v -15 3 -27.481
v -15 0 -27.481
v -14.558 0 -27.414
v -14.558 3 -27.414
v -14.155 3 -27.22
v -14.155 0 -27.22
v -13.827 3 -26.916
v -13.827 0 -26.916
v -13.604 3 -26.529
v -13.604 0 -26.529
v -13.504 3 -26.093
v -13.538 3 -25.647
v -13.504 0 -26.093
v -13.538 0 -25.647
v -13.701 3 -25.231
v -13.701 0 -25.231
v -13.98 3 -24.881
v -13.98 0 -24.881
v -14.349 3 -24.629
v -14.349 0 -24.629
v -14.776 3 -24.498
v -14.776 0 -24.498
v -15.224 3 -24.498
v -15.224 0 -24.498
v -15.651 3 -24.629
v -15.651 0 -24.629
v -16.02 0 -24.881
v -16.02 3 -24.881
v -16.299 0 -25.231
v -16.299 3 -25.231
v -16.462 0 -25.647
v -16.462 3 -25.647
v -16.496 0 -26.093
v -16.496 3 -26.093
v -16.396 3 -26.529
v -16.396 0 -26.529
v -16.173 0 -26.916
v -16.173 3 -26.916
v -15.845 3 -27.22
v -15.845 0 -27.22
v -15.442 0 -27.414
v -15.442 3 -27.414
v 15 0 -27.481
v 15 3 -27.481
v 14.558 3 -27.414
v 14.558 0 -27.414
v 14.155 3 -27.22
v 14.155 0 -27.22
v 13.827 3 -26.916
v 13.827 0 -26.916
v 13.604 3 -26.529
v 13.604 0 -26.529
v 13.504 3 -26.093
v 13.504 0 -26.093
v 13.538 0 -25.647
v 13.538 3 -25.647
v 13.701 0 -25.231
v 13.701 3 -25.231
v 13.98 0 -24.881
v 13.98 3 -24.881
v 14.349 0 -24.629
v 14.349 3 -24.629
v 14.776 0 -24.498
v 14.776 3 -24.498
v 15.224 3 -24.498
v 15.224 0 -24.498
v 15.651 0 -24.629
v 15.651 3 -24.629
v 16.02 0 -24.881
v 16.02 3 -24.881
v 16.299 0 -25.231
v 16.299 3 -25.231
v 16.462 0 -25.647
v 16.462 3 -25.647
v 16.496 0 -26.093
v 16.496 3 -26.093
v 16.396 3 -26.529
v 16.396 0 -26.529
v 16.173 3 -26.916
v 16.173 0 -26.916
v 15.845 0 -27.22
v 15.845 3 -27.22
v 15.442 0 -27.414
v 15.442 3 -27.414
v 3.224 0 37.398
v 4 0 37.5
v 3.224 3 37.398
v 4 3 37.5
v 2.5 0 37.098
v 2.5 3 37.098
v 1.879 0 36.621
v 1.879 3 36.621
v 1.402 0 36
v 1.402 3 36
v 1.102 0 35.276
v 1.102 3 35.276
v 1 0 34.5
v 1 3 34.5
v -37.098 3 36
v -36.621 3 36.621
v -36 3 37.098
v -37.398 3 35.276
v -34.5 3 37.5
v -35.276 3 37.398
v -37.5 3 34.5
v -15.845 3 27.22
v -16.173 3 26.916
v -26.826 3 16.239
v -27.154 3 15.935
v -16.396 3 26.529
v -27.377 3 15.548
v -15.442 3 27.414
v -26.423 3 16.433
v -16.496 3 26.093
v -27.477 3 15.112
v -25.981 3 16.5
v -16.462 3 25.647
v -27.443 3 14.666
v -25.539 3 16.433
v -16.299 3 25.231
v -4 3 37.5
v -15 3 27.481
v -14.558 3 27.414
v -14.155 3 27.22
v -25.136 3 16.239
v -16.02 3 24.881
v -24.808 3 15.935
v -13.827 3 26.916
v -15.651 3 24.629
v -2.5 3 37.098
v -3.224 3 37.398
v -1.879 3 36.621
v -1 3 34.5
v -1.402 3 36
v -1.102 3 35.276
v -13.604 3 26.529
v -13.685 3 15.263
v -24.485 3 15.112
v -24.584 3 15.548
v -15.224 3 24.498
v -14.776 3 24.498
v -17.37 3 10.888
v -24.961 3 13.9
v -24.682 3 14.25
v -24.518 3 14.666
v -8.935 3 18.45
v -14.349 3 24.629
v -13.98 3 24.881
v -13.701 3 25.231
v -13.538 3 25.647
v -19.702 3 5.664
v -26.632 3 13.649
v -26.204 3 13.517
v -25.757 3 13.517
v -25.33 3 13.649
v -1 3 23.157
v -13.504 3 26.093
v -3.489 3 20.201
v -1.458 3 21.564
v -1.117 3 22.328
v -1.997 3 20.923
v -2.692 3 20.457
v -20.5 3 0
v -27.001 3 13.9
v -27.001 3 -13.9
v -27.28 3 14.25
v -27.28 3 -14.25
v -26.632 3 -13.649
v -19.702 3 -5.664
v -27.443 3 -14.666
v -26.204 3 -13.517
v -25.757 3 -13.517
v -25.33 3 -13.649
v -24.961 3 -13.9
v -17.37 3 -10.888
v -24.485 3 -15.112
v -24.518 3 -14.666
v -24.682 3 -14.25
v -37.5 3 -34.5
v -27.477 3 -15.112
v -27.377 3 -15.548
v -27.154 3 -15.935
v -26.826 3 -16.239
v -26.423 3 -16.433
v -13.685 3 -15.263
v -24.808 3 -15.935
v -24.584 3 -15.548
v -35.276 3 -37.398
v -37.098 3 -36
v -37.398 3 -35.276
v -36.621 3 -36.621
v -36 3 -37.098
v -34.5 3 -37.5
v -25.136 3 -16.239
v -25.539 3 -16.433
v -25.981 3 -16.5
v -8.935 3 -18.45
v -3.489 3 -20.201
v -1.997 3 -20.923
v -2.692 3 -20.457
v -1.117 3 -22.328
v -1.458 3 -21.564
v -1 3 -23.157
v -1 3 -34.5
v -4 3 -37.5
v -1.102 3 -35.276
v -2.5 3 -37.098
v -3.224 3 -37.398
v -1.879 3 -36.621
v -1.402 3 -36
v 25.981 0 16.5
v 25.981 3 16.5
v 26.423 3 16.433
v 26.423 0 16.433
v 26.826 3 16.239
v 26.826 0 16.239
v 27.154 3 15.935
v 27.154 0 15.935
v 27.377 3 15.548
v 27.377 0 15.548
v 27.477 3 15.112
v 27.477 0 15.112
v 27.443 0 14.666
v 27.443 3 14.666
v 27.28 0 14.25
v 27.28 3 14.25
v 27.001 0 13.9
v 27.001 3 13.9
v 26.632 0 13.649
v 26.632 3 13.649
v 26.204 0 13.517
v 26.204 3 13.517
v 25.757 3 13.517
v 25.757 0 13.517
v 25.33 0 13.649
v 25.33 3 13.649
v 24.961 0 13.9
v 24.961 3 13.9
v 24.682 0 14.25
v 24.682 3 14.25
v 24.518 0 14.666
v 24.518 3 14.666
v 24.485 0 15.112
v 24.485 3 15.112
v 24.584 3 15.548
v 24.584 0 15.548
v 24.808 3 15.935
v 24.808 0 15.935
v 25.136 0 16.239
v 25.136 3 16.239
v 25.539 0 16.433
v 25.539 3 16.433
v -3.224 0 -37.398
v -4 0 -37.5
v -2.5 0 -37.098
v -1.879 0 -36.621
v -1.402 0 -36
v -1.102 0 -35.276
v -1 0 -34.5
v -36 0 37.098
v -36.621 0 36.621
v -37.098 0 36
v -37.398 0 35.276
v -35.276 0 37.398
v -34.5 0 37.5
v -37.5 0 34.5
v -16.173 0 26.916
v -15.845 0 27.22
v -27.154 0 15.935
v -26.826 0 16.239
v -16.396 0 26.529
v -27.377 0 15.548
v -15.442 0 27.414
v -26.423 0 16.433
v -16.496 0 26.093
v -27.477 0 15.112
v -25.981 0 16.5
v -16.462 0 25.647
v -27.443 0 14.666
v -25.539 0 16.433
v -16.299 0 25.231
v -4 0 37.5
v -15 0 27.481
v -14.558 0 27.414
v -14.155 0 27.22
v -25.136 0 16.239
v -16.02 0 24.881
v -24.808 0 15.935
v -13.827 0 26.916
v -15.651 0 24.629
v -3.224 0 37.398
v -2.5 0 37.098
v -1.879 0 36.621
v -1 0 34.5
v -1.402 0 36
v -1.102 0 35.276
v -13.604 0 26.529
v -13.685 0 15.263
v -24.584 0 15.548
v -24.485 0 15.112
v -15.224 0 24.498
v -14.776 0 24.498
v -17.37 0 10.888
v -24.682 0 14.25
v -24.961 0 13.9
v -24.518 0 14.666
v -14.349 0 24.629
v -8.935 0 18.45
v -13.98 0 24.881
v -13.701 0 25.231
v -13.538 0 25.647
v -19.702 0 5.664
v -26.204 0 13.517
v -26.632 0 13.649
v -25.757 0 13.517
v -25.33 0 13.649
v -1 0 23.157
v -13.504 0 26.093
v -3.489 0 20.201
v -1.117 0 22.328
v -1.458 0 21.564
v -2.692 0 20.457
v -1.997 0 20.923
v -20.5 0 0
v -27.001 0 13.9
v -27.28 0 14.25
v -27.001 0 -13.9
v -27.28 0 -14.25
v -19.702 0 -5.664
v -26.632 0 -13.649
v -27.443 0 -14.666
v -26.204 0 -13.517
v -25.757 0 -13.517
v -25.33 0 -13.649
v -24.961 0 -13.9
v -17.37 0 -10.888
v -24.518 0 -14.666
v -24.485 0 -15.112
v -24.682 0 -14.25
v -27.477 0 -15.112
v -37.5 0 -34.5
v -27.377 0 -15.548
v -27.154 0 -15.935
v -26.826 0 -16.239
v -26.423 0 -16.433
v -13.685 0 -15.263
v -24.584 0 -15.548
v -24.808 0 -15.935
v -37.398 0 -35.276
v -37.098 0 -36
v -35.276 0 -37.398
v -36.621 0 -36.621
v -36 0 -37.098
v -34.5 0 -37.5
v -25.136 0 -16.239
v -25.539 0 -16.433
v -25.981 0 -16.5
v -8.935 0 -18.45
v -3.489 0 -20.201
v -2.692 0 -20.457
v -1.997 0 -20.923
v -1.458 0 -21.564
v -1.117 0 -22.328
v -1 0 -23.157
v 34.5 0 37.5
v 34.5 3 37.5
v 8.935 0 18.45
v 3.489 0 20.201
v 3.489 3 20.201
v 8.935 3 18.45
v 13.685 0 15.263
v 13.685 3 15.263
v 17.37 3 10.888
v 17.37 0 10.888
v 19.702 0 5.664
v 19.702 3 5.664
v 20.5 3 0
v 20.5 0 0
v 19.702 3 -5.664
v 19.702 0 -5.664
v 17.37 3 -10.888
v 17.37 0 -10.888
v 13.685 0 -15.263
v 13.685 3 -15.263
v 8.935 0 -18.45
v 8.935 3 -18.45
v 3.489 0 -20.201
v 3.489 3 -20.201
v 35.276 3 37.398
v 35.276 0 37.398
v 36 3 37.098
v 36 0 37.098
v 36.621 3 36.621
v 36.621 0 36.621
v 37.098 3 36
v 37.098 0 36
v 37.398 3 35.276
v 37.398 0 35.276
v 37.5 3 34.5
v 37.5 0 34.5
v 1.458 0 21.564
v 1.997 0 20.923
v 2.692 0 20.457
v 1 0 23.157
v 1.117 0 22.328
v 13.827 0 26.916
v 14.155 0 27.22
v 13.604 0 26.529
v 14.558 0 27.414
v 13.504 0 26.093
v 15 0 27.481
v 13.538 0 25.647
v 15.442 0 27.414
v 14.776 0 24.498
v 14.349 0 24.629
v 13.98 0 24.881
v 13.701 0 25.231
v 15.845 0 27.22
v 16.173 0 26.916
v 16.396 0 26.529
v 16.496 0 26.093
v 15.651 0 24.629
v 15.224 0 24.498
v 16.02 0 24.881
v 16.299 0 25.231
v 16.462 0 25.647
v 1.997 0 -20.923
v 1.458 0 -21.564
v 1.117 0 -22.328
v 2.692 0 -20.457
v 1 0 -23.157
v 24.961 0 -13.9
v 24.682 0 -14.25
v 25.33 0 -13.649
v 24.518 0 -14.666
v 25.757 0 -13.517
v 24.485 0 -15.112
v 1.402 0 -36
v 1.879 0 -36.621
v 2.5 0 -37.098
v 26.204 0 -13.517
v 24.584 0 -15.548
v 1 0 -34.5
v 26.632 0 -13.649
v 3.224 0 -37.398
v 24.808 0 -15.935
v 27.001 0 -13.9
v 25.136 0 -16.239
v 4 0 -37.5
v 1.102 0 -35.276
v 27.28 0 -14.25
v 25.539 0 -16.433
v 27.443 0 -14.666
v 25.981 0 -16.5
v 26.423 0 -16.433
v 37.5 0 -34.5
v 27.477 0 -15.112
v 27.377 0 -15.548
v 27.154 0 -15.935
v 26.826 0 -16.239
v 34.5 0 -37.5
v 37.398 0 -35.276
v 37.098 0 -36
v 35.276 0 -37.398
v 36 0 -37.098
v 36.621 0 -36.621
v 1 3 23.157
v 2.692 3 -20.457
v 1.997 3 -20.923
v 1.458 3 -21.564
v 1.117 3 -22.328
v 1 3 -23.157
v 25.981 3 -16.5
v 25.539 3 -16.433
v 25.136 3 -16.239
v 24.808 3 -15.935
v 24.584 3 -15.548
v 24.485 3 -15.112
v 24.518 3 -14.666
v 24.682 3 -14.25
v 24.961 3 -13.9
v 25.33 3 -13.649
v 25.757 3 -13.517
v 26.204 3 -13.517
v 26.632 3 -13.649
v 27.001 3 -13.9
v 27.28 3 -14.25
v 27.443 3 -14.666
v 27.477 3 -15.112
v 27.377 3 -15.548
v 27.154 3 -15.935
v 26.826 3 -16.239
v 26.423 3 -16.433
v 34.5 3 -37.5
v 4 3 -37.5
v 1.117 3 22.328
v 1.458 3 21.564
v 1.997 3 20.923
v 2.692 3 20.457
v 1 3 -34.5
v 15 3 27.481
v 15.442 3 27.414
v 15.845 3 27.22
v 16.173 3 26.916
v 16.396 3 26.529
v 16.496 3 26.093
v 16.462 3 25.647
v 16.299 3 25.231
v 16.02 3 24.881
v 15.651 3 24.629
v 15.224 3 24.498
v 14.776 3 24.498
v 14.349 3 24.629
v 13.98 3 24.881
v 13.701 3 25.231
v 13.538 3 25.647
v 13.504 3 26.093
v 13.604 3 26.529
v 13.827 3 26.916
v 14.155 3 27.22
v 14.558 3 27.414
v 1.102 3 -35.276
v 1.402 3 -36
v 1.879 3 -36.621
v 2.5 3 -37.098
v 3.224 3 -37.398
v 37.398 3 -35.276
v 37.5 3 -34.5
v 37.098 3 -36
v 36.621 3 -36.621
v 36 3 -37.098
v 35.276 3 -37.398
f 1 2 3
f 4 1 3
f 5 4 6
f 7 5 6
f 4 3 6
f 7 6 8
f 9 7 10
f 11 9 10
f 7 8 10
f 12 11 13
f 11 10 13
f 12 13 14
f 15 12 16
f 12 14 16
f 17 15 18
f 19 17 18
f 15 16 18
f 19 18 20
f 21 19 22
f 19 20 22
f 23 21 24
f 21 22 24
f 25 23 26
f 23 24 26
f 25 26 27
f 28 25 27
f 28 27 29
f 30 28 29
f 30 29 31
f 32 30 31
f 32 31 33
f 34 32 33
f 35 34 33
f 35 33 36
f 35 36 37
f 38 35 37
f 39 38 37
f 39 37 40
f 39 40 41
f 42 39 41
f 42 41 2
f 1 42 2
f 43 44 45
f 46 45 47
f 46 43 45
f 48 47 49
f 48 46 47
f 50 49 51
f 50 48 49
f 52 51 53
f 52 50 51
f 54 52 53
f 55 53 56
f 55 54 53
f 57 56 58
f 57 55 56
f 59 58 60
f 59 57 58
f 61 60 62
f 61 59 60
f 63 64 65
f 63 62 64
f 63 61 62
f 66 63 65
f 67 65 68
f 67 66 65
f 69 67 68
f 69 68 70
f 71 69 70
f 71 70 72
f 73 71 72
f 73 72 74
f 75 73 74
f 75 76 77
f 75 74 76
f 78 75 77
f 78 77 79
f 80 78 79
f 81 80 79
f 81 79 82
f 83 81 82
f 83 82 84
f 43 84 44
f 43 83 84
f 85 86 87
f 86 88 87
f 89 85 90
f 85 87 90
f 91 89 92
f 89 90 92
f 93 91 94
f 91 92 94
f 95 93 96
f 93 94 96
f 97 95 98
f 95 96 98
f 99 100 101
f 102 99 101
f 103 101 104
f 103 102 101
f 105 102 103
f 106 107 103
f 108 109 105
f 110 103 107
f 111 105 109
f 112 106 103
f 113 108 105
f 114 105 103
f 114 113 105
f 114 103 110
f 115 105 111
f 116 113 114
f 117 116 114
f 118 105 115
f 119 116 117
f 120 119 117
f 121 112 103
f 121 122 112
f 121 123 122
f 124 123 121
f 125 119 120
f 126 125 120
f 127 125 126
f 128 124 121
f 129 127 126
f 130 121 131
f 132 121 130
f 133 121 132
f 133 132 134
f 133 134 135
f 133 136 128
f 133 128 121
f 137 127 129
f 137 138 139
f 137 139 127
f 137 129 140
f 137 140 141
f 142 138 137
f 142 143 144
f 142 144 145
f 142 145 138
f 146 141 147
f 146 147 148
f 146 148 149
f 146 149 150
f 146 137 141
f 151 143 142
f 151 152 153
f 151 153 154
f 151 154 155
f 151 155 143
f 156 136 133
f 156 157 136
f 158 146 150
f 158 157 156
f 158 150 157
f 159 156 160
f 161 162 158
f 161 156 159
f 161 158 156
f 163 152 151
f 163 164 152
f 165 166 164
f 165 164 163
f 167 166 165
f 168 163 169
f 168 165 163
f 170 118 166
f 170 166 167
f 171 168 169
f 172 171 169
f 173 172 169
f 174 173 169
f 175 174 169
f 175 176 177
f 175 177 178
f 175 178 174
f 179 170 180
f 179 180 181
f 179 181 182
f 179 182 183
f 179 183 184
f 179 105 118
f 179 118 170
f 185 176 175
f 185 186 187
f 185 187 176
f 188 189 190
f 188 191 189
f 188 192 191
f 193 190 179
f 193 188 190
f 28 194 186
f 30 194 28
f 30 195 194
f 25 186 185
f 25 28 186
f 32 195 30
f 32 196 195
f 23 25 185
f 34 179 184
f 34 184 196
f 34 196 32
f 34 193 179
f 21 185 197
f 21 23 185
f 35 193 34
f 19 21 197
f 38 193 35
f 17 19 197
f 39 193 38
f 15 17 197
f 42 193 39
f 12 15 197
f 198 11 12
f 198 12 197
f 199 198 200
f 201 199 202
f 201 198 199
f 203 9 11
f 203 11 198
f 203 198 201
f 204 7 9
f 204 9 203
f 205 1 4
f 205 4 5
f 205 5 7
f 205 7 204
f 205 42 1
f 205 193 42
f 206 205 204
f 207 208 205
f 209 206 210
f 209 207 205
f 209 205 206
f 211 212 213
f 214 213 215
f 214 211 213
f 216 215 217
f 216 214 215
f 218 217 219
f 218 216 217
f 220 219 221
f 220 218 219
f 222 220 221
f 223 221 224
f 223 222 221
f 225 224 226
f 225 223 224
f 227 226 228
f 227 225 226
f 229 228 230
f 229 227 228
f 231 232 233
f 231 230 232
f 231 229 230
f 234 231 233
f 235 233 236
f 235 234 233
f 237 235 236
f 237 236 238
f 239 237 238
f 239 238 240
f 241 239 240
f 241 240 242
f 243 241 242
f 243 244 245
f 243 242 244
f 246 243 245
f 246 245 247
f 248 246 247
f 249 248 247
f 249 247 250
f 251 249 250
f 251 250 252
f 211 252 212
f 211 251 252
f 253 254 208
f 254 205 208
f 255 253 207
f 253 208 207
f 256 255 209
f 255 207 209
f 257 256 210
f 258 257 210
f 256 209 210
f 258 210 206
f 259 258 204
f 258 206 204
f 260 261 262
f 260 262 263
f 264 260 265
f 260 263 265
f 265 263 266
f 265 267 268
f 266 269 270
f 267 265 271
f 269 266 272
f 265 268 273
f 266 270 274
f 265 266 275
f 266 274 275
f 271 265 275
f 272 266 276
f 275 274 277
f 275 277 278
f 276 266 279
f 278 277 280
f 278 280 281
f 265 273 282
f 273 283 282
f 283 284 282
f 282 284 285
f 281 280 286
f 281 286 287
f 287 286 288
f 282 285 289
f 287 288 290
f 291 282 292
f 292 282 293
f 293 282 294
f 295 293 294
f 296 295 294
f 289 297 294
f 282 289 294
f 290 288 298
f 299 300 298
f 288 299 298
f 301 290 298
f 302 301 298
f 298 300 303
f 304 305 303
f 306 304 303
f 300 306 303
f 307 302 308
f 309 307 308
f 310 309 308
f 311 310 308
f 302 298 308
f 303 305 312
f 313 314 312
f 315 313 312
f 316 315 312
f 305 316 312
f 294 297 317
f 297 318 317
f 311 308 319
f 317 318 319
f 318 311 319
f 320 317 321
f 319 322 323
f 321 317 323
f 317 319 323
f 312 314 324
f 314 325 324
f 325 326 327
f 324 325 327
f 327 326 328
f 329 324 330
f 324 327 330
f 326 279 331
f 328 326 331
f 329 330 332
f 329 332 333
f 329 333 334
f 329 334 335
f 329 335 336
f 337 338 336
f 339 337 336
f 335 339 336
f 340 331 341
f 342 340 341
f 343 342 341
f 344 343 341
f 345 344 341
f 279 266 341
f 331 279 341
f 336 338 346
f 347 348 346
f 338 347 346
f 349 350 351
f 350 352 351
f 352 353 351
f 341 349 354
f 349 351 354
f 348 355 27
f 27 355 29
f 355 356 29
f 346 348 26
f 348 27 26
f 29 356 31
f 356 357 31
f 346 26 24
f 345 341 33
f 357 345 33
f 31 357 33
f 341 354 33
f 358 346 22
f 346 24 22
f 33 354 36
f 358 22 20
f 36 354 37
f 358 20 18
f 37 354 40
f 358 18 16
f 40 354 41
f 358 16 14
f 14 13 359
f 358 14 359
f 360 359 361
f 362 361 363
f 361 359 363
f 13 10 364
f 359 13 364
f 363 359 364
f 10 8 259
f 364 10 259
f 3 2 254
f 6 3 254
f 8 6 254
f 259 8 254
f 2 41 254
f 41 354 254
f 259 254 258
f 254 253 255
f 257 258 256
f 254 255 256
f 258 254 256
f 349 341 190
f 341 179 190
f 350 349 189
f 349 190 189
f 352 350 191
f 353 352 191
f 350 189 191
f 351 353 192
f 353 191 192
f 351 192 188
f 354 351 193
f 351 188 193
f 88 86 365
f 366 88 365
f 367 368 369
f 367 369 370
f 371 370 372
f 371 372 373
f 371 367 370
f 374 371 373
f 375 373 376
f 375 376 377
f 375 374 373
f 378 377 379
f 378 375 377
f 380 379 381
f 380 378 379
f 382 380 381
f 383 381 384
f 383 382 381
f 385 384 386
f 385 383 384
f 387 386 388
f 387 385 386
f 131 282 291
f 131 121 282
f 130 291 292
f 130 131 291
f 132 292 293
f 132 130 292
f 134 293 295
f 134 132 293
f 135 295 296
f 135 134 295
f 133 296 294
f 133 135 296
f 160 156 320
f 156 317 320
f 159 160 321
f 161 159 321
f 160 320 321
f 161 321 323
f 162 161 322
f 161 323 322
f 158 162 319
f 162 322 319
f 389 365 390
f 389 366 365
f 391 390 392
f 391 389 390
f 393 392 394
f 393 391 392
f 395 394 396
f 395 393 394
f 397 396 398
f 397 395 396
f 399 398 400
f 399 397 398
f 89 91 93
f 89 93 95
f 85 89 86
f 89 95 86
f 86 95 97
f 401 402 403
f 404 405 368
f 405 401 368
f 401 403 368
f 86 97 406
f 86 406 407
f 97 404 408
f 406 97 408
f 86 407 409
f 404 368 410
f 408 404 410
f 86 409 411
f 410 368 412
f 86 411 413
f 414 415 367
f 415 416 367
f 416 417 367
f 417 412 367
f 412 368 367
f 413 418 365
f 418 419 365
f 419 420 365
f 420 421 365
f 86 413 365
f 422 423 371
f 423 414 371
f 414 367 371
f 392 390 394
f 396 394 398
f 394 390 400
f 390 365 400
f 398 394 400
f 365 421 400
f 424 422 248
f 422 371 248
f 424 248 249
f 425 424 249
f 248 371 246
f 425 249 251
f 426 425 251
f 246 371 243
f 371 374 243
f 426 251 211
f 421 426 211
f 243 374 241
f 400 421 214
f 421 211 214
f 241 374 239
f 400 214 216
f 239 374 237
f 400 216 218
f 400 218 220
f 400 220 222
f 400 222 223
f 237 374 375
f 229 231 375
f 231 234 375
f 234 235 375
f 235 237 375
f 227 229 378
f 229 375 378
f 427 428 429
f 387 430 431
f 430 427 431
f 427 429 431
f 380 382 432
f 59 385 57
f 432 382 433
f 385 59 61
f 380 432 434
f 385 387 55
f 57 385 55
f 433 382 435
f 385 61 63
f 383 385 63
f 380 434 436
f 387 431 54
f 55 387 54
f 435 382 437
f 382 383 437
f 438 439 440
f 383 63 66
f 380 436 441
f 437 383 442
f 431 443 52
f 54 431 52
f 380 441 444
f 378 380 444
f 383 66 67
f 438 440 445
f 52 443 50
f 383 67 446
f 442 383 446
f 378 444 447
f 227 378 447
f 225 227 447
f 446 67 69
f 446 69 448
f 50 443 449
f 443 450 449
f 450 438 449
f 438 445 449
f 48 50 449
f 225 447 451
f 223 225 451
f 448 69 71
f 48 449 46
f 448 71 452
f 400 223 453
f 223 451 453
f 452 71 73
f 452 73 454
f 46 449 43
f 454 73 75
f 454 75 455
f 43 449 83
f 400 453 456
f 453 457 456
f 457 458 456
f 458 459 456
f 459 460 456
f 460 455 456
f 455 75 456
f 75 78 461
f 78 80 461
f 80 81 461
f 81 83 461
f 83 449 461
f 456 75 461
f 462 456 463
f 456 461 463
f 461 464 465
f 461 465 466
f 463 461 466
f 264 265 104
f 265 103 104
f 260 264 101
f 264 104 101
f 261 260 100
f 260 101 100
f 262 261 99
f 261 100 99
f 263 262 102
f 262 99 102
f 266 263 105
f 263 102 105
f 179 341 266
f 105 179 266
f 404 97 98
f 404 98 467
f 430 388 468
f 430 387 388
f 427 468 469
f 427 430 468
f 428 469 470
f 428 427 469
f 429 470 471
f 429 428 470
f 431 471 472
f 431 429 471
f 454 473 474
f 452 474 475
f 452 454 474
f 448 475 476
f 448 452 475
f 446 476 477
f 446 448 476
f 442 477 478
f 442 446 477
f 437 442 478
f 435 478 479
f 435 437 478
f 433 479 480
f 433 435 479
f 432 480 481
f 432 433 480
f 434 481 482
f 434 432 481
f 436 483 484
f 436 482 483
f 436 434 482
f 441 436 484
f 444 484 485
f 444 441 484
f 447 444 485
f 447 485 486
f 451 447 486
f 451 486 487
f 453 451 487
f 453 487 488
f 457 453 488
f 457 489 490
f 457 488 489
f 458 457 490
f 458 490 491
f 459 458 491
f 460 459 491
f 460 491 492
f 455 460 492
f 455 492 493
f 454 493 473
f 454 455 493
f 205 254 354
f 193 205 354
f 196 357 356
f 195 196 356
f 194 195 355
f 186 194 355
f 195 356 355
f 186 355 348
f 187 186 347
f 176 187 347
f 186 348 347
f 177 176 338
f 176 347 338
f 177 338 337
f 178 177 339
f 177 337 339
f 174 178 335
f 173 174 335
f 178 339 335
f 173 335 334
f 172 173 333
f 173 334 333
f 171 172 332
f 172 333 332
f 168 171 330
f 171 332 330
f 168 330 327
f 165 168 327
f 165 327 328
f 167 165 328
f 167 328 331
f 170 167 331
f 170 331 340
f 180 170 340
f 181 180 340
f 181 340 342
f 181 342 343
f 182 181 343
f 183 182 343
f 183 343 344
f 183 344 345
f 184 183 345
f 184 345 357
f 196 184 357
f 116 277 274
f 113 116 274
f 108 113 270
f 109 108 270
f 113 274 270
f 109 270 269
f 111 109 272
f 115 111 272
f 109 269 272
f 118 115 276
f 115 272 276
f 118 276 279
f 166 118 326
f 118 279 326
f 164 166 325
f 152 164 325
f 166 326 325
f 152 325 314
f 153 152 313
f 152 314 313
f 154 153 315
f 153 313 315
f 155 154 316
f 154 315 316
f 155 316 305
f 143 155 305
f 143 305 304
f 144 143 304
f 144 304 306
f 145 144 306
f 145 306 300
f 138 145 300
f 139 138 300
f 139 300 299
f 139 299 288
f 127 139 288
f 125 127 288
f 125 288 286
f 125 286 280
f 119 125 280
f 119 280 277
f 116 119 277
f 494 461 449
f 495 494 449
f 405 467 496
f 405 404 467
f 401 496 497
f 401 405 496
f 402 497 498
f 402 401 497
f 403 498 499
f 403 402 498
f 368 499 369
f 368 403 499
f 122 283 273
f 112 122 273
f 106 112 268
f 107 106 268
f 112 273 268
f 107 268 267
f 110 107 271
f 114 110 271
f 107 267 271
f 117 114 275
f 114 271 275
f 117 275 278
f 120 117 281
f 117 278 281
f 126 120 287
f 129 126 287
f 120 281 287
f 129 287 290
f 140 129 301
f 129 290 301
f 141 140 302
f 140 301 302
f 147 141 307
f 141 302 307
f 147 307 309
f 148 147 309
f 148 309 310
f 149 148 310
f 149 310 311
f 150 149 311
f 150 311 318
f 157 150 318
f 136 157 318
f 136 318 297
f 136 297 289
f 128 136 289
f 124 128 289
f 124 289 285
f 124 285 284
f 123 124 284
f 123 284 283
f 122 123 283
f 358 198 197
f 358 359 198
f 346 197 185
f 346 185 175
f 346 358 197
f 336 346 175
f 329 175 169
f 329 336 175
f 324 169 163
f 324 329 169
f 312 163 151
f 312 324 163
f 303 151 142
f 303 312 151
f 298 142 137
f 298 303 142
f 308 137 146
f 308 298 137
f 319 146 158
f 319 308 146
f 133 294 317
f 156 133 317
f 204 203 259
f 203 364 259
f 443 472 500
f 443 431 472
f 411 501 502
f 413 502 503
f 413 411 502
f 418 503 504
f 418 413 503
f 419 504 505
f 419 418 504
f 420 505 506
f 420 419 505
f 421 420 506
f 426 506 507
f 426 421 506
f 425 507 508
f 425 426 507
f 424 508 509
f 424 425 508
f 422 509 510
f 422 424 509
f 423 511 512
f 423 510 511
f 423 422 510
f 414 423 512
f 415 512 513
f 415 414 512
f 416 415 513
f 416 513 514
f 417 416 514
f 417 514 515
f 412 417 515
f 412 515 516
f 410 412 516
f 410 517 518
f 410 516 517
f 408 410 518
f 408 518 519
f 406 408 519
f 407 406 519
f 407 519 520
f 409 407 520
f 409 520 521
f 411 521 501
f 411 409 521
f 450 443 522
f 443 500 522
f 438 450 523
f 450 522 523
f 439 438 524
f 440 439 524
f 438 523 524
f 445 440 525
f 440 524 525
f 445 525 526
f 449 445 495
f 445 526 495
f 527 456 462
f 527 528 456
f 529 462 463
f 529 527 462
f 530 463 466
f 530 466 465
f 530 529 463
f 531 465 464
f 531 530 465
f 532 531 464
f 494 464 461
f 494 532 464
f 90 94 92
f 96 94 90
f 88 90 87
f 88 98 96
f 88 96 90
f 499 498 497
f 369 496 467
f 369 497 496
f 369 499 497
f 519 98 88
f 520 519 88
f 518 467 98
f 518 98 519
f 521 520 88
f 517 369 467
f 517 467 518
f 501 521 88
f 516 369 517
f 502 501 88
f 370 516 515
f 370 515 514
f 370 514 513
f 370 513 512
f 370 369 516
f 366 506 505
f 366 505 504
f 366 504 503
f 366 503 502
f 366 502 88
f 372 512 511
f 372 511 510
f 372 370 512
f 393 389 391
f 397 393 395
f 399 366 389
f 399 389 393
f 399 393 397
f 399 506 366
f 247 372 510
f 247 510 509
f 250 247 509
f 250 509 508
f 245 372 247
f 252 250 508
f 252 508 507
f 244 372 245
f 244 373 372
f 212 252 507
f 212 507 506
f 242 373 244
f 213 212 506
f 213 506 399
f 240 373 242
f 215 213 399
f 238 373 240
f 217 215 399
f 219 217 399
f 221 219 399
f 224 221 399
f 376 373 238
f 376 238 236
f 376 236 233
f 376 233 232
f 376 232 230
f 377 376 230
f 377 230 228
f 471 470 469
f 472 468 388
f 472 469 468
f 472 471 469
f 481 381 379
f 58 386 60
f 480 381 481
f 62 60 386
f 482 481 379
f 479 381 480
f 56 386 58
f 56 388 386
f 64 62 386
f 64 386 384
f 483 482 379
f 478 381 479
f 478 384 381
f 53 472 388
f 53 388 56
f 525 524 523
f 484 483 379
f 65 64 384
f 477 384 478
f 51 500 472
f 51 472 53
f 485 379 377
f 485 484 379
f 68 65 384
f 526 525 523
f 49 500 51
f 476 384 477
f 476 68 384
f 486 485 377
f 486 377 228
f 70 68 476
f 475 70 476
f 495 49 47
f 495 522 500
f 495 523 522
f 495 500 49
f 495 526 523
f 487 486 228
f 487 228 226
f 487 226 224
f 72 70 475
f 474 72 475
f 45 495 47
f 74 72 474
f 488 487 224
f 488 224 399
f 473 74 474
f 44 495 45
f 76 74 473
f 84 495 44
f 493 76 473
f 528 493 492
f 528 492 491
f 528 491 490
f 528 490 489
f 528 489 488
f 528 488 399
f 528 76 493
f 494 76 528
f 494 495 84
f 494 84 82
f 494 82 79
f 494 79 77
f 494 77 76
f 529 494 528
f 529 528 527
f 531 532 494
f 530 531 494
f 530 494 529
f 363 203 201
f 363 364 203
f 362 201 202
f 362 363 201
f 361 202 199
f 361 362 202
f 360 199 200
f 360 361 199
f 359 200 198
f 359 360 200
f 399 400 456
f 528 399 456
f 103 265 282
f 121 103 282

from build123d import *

# Parameters (mm, degrees)
SKETCH2_R            = 20.5
BOSS_EXTRUDE1_DEPTH  = 3
HALFSPLIT_DEPTH      = 54.117793629
HALFSPLIT_DEPTH_BACK = 54.117793629
SKETCH3_W            = 2
SKETCH3_H            = 75
SKETCH4_R            = 1.5
HOLES_DEPTH          = 54.117793629
FILLET1_R            = 3
FILLET2_R            = 3


with BuildPart() as part:
    # Sketch2 → Boss-Extrude1 (new body)
    with BuildSketch(Plane(origin=(0, 0, 0), x_dir=(1, 0, 0), z_dir=(0, 1, 0))):
        Polygon((-37.5, -37.5), (0, -37.5), (37.5, -37.5), (37.5, 37.5), (-37.5, 37.5), align=None)
        Circle(SKETCH2_R, mode=Mode.SUBTRACT)
    extrude(amount=BOSS_EXTRUDE1_DEPTH)

    # Sketch3 → HalfSplit (cut, two sides: drawn at the far end of the back side and taken through both)
    with BuildSketch(Plane(origin=(0, 0, 0), x_dir=(1, 0, 0), z_dir=(0, 1, 0)).offset(-HALFSPLIT_DEPTH_BACK)):
        Rectangle(SKETCH3_W, SKETCH3_H)
    extrude(amount=HALFSPLIT_DEPTH + HALFSPLIT_DEPTH_BACK, mode=Mode.SUBTRACT)


with BuildPart() as halfsplit_piece_1:
    # of the separate pieces the step leaves, piece 1, a body of its own (halfsplit_pieces)
    add(part.part.solids().sort_by_distance((-37.5, 0, 37.5))[0])

    # Fillet2
    fillet2_edges = [halfsplit_piece_1.edges().sort_by_distance(p)[0] for p in [
        (-37.5, 1.5, 37.5),
        (-37.5, 1.5, -37.5),
        (-1, 1.5, -20.475595229),
        (-1, 1.5, 20.475595229),
        (-1, 1.5, 37.5),
        (-1, 1.5, -37.5),
    ]]
    fillet(fillet2_edges, radius=FILLET2_R)


with BuildPart() as halfsplit_piece_2:
    # of the separate pieces the step leaves, piece 2, a body of its own (halfsplit_pieces)
    add(part.part.solids().sort_by_distance((1, 0, 37.5))[0])

    # Sketch4 → Holes (cut, through all)
    with BuildSketch(Plane(origin=(0, 0, 0), x_dir=(1, 0, 0), z_dir=(0, 1, 0))):
        with Locations((25.980762114, -15)):
            Circle(SKETCH4_R)
        with Locations((25.980762114, 15)):
            Circle(SKETCH4_R)
        with Locations((15, -25.980762114)):
            Circle(SKETCH4_R)
        with Locations((15, 25.980762114)):
            Circle(SKETCH4_R)
    holes = extrude(amount=HOLES_DEPTH, mode=Mode.SUBTRACT)

    # Fillet1
    fillet1_edges = [halfsplit_piece_2.edges().sort_by_distance(p)[0] for p in [
        (37.5, 1.5, 37.5),
        (1, 1.5, 37.5),
        (1, 1.5, 20.475595229),
        (1, 1.5, -20.475595229),
        (1, 1.5, -37.5),
        (37.5, 1.5, -37.5),
    ]]
    fillet(fillet1_edges, radius=FILLET1_R)


with BuildPart() as halfsplit_piece_1_1:
    add(halfsplit_piece_1.part)

    # Mirror-Holes: Holes across plane
    add(holes.mirror(Plane(origin=(0, 0, 0), x_dir=(0, 0, 1), z_dir=(1, 0, 0))), mode=Mode.SUBTRACT)


solid = Compound([halfsplit_piece_2.part, halfsplit_piece_1_1.part])
